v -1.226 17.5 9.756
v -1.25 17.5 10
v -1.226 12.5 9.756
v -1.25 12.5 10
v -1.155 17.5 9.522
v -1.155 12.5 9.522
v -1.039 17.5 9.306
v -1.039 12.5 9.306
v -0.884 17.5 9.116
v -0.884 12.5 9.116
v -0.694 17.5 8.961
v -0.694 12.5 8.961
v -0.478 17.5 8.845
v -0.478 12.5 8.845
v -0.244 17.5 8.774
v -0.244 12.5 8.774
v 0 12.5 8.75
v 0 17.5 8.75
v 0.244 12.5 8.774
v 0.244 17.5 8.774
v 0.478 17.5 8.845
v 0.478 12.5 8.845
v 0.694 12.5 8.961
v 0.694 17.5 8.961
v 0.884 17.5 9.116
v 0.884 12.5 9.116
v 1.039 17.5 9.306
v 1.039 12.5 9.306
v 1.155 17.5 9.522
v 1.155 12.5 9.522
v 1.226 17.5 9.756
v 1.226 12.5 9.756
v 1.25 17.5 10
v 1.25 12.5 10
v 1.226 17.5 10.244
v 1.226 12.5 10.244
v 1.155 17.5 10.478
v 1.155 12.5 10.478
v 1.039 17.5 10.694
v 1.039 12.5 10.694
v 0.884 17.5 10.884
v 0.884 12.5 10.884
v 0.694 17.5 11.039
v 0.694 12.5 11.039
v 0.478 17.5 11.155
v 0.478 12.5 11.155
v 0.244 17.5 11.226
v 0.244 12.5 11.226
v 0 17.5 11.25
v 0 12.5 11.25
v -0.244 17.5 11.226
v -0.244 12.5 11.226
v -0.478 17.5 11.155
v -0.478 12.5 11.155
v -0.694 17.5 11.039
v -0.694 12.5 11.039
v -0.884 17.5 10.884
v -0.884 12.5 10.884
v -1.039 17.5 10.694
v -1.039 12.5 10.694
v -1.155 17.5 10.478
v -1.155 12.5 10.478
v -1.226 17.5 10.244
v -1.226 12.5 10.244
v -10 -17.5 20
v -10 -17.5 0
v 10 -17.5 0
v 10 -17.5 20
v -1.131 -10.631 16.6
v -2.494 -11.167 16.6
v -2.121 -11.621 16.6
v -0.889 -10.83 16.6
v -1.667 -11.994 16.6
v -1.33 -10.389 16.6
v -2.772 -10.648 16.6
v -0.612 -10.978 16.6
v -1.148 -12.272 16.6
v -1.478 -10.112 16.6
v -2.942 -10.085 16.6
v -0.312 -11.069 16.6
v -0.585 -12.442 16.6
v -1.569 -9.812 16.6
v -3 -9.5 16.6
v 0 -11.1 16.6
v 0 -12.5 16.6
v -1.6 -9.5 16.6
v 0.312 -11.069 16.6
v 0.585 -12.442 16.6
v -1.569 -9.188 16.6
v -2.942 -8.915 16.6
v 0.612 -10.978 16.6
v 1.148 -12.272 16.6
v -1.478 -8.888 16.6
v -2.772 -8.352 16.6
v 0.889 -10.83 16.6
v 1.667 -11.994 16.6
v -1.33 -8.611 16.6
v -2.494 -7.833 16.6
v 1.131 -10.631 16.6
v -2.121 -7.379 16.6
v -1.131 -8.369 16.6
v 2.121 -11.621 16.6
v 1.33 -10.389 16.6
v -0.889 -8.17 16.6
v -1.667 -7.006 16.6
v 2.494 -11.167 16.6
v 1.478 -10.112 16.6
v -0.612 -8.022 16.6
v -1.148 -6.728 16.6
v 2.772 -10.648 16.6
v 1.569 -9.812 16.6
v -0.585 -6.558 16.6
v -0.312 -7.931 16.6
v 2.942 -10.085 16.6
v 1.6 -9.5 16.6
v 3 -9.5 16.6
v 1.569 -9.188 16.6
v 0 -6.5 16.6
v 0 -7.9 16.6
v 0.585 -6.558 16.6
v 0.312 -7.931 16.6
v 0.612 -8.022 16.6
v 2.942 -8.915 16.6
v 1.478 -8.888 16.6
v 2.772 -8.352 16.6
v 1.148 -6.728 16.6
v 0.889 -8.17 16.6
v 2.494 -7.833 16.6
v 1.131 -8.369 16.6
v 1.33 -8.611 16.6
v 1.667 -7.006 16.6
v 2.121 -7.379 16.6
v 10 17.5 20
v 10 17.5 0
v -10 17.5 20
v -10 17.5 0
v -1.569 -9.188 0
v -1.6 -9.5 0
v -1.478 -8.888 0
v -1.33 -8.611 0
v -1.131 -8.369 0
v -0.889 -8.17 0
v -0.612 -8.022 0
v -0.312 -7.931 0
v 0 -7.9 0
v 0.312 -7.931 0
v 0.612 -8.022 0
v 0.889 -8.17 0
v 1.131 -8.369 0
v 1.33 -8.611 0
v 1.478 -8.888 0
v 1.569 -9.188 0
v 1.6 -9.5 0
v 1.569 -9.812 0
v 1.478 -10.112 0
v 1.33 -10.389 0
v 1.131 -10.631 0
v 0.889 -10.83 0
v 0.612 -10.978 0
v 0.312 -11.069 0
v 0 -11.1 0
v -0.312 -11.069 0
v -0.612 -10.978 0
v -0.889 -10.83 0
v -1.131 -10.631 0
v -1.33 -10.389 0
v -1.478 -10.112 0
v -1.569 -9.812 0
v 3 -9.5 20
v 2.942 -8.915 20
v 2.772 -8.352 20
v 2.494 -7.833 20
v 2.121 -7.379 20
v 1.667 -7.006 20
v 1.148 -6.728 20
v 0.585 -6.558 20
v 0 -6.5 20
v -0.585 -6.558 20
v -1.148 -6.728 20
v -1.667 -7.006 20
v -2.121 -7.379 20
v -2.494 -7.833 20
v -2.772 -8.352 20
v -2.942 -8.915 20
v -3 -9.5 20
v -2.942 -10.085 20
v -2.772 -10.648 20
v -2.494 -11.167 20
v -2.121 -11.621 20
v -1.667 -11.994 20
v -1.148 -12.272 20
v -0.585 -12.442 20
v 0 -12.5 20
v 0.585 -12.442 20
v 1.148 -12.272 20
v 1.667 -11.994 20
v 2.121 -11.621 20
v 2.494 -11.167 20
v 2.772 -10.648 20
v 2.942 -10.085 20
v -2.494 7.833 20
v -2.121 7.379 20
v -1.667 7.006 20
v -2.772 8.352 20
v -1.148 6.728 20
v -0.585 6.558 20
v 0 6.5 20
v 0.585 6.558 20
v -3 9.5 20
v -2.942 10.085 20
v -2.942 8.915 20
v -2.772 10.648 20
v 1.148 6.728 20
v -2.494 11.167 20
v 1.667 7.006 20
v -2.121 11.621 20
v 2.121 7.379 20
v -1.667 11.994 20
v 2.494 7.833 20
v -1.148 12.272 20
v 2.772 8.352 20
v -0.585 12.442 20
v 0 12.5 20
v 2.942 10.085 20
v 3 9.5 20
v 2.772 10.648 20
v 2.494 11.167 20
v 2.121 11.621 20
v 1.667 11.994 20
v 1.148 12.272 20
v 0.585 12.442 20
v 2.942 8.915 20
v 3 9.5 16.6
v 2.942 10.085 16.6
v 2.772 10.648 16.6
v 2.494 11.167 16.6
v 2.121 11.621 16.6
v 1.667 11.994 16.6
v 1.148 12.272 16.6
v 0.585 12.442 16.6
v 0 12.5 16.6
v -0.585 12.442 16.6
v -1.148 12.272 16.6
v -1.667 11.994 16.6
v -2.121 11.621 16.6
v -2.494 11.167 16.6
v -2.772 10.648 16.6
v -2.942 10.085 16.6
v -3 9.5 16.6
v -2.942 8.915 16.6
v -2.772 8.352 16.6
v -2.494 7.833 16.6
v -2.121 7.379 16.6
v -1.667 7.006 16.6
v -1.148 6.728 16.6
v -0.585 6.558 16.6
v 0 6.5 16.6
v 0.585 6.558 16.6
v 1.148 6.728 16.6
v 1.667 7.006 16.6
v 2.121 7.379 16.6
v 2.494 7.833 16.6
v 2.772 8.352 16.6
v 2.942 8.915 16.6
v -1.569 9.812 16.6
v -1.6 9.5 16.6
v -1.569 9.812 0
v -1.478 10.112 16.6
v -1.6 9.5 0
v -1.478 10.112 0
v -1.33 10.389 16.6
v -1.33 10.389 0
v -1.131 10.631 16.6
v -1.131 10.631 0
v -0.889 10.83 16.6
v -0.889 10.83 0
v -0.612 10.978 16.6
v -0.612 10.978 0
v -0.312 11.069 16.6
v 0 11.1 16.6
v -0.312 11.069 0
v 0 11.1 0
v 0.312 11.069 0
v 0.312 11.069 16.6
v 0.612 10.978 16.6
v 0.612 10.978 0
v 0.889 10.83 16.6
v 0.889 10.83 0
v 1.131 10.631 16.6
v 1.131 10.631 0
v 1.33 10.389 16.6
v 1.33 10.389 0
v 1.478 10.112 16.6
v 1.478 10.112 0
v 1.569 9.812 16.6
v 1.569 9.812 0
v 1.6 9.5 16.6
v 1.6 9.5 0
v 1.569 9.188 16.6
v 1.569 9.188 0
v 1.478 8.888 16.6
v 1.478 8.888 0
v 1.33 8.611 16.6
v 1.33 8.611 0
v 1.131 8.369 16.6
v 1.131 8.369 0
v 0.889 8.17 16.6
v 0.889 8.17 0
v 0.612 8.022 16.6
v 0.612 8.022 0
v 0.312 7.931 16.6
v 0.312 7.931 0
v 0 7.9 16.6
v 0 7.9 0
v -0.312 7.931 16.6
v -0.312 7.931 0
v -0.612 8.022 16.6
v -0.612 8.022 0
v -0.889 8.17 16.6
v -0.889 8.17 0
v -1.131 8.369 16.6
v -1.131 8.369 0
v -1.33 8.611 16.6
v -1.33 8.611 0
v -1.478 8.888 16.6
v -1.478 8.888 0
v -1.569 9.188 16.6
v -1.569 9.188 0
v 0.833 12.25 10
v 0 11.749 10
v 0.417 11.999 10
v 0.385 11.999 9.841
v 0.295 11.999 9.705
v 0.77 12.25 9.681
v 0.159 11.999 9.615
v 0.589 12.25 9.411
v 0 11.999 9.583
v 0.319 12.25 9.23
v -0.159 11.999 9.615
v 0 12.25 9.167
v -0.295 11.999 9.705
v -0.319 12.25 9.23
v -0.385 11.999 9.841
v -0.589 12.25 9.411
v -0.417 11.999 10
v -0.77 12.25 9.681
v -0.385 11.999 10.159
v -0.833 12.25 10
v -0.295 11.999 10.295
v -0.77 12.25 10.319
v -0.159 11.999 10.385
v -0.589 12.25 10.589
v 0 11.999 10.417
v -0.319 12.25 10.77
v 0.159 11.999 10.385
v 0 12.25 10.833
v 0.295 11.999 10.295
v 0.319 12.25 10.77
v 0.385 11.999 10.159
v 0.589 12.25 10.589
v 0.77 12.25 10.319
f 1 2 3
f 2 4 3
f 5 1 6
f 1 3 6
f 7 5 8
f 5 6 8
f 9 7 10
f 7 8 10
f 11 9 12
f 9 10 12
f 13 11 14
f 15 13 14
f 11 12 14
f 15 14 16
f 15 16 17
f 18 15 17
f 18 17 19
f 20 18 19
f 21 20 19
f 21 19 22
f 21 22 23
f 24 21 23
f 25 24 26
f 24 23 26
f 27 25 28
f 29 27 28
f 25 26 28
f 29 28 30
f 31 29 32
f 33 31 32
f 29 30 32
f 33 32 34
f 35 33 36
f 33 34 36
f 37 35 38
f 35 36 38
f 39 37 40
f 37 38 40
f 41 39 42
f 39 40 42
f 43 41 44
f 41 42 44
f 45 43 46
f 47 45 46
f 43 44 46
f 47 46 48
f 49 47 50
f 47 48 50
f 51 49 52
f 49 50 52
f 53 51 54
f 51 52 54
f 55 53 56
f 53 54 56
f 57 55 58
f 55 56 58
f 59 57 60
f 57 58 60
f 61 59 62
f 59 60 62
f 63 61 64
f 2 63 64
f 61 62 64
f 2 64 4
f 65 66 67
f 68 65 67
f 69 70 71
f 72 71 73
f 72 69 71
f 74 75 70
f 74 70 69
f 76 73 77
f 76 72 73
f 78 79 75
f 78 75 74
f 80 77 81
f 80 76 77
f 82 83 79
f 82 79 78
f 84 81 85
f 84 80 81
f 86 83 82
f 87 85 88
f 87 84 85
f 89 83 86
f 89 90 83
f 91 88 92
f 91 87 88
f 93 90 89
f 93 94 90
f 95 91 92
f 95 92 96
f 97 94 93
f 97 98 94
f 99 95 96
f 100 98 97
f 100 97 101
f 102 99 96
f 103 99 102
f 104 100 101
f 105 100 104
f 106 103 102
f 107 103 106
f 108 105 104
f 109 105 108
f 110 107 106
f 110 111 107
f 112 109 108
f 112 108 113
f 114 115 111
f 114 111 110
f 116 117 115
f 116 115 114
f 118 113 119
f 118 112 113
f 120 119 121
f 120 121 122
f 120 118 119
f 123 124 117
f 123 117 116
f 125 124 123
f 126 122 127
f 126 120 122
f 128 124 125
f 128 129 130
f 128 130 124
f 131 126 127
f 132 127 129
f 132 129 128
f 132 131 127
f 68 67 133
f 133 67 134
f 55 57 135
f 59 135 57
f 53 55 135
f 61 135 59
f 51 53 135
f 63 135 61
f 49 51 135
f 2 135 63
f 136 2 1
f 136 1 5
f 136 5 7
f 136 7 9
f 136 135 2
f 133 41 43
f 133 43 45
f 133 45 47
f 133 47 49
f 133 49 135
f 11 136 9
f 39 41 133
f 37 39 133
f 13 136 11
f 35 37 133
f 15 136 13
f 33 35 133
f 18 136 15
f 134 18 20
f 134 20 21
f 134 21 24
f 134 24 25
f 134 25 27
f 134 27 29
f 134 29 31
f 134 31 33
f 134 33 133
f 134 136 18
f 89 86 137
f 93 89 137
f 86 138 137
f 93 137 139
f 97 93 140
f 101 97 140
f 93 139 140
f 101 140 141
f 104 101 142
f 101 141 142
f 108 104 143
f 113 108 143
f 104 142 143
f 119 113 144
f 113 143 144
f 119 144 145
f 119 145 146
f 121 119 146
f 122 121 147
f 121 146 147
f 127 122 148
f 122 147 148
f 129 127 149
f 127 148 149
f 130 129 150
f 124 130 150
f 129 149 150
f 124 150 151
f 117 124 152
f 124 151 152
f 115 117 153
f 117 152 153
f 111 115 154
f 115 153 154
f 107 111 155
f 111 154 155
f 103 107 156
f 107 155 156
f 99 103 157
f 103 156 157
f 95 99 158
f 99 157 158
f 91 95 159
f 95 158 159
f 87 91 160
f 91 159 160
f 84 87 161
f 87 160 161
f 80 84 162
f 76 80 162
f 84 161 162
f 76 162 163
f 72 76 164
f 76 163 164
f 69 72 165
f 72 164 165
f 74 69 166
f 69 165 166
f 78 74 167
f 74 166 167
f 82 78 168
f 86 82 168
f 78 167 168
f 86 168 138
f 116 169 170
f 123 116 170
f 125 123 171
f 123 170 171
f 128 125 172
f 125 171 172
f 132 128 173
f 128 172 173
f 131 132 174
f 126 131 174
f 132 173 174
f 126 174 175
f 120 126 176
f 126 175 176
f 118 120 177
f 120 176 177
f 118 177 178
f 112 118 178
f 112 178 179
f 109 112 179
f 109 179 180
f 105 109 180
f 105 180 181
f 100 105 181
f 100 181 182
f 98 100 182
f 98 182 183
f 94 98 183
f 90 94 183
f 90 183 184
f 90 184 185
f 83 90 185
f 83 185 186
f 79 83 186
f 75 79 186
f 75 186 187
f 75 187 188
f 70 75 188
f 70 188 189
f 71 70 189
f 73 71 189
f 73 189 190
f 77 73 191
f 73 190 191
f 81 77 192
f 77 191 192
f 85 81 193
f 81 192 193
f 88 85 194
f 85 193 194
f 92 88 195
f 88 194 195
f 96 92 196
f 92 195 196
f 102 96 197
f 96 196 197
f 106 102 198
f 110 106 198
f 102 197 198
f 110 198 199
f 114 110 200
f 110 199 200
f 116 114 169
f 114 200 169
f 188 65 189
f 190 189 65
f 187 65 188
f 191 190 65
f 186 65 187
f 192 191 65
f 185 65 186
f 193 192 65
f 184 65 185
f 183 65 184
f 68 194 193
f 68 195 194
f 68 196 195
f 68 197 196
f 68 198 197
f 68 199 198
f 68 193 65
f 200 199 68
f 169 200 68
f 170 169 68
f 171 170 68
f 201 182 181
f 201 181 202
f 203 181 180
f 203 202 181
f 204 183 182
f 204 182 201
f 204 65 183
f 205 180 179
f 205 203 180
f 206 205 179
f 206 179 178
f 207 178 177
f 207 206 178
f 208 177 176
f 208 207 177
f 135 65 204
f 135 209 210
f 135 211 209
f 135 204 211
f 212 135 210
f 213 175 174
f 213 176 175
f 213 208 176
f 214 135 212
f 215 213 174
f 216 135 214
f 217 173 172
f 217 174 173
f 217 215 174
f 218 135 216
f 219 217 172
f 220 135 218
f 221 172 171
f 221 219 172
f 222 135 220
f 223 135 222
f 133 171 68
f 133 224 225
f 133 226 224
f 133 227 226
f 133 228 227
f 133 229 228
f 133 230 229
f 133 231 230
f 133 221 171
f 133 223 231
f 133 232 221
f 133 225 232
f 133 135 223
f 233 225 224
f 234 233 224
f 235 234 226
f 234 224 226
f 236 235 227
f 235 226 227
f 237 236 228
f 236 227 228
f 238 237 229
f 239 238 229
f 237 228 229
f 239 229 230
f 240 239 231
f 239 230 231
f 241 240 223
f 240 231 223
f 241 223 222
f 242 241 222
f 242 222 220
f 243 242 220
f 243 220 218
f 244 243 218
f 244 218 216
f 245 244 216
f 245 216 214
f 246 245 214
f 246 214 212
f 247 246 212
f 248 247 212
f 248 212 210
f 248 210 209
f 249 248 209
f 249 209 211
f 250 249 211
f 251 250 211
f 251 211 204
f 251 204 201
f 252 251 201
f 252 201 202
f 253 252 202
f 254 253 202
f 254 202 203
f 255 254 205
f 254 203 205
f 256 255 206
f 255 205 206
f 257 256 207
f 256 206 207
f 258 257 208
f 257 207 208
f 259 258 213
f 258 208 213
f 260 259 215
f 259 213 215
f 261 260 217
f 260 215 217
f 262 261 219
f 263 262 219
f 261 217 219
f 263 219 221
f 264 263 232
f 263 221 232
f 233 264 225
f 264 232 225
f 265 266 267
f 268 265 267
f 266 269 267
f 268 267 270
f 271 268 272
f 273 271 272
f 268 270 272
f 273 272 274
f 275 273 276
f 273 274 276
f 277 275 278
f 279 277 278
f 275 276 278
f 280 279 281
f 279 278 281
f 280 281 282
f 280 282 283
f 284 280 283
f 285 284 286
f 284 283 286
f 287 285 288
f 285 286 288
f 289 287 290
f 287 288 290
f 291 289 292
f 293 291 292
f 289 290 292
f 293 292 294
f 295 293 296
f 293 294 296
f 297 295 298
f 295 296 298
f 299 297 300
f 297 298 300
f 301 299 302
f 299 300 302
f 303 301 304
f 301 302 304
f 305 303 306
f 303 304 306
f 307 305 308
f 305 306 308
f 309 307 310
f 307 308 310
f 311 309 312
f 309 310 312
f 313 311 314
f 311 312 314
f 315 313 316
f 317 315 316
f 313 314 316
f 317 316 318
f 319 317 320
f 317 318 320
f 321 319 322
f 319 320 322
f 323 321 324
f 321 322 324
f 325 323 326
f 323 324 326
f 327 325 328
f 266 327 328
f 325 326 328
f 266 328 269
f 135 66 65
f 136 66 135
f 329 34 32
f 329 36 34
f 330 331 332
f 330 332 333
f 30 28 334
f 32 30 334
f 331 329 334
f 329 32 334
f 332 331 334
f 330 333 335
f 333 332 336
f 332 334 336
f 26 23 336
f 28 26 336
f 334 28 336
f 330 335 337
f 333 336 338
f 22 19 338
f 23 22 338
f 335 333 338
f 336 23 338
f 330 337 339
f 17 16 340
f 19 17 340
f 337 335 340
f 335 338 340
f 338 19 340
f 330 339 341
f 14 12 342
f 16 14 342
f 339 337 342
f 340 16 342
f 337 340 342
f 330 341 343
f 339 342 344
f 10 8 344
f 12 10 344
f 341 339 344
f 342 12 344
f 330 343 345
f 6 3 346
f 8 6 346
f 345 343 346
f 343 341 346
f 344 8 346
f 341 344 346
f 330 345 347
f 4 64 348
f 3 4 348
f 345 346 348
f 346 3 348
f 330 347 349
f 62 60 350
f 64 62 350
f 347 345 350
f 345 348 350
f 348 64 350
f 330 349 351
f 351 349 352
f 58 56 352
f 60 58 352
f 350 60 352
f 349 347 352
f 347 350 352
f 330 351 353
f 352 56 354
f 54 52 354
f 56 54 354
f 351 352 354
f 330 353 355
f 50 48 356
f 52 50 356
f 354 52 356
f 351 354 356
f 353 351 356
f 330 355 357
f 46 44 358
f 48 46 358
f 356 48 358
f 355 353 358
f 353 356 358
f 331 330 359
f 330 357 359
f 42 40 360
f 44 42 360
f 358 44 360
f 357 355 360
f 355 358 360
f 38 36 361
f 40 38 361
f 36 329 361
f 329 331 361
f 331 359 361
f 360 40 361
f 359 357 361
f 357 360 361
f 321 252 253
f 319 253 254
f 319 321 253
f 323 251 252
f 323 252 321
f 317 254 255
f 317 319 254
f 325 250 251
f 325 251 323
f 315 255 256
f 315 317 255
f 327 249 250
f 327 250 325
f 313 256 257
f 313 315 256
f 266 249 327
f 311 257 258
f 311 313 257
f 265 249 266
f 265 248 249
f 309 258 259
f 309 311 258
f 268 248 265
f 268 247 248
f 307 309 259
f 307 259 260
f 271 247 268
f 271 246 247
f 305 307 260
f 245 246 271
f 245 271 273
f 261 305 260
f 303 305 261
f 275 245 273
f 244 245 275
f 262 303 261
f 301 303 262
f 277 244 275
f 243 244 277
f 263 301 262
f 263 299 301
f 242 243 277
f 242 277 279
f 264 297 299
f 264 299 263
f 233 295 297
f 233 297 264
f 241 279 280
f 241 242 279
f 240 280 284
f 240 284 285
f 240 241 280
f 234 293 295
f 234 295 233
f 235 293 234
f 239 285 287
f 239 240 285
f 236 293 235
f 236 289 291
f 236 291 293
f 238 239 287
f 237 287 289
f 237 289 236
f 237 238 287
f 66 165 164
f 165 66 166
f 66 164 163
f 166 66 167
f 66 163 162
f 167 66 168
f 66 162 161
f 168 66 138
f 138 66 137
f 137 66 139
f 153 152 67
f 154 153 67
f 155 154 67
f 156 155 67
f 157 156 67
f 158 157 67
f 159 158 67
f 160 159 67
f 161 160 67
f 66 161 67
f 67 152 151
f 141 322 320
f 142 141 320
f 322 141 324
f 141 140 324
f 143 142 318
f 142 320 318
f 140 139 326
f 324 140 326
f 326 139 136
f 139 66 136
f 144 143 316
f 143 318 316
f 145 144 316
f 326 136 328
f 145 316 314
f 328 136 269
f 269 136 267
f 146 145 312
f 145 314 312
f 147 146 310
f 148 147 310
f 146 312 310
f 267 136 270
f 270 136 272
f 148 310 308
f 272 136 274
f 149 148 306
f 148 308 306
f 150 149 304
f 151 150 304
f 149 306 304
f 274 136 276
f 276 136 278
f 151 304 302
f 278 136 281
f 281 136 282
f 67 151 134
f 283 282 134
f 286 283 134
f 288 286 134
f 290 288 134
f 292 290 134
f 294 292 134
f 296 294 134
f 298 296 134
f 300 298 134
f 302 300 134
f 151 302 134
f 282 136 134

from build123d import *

# Parameters (mm, degrees)
SKETCH1_W                                            = 20
SKETCH1_H                                            = 35
BOSS_EXTRUDE1_DEPTH                                  = 20
CBORE_FOR_M3_HEXAGON_SOCKET_HEAD_CAP_SCR_D           = 3.2
CBORE_FOR_M3_HEXAGON_SOCKET_HEAD_CAP_SCR_CBORE_D     = 6
CBORE_FOR_M3_HEXAGON_SOCKET_HEAD_CAP_SCR_CBORE_DEPTH = 3.4
TAP_DRILL_FOR_M3_TAP1_D                              = 2.5
TAP_DRILL_FOR_M3_TAP1_DEPTH                          = 5
TAP_DRILL_FOR_M3_TAP1_TIP                            = 0.751075774


with BuildPart() as part:
    # Sketch1 → Boss-Extrude1 (new body)
    with BuildSketch(Plane.XY):
        Rectangle(SKETCH1_W, SKETCH1_H)
    extrude(amount=BOSS_EXTRUDE1_DEPTH)

    # CBORE for M3 Hexagon socket head cap screws1 (through all)
    with Locations(Plane(origin=(0, 9.5, 20), x_dir=(1, 0, 0), z_dir=(0, 0, 1))):
        with Locations((0, 0), (0, -19)):
            CounterBoreHole(CBORE_FOR_M3_HEXAGON_SOCKET_HEAD_CAP_SCR_D / 2, CBORE_FOR_M3_HEXAGON_SOCKET_HEAD_CAP_SCR_CBORE_D / 2, CBORE_FOR_M3_HEXAGON_SOCKET_HEAD_CAP_SCR_CBORE_DEPTH)

    # Tap Drill for M3 Tap1
    with Locations(Plane(origin=(0, 17.5, 0), x_dir=(1, 0, 0), z_dir=(0, 1, 0))):
        with Locations((0, -10)):
            Hole(TAP_DRILL_FOR_M3_TAP1_D / 2, depth=TAP_DRILL_FOR_M3_TAP1_DEPTH)
            with Locations((0, 0, -(TAP_DRILL_FOR_M3_TAP1_DEPTH + TAP_DRILL_FOR_M3_TAP1_TIP / 2))):  # 118° drill point
                Cone(0, TAP_DRILL_FOR_M3_TAP1_D / 2, TAP_DRILL_FOR_M3_TAP1_TIP, mode=Mode.SUBTRACT)


solid = part.part
